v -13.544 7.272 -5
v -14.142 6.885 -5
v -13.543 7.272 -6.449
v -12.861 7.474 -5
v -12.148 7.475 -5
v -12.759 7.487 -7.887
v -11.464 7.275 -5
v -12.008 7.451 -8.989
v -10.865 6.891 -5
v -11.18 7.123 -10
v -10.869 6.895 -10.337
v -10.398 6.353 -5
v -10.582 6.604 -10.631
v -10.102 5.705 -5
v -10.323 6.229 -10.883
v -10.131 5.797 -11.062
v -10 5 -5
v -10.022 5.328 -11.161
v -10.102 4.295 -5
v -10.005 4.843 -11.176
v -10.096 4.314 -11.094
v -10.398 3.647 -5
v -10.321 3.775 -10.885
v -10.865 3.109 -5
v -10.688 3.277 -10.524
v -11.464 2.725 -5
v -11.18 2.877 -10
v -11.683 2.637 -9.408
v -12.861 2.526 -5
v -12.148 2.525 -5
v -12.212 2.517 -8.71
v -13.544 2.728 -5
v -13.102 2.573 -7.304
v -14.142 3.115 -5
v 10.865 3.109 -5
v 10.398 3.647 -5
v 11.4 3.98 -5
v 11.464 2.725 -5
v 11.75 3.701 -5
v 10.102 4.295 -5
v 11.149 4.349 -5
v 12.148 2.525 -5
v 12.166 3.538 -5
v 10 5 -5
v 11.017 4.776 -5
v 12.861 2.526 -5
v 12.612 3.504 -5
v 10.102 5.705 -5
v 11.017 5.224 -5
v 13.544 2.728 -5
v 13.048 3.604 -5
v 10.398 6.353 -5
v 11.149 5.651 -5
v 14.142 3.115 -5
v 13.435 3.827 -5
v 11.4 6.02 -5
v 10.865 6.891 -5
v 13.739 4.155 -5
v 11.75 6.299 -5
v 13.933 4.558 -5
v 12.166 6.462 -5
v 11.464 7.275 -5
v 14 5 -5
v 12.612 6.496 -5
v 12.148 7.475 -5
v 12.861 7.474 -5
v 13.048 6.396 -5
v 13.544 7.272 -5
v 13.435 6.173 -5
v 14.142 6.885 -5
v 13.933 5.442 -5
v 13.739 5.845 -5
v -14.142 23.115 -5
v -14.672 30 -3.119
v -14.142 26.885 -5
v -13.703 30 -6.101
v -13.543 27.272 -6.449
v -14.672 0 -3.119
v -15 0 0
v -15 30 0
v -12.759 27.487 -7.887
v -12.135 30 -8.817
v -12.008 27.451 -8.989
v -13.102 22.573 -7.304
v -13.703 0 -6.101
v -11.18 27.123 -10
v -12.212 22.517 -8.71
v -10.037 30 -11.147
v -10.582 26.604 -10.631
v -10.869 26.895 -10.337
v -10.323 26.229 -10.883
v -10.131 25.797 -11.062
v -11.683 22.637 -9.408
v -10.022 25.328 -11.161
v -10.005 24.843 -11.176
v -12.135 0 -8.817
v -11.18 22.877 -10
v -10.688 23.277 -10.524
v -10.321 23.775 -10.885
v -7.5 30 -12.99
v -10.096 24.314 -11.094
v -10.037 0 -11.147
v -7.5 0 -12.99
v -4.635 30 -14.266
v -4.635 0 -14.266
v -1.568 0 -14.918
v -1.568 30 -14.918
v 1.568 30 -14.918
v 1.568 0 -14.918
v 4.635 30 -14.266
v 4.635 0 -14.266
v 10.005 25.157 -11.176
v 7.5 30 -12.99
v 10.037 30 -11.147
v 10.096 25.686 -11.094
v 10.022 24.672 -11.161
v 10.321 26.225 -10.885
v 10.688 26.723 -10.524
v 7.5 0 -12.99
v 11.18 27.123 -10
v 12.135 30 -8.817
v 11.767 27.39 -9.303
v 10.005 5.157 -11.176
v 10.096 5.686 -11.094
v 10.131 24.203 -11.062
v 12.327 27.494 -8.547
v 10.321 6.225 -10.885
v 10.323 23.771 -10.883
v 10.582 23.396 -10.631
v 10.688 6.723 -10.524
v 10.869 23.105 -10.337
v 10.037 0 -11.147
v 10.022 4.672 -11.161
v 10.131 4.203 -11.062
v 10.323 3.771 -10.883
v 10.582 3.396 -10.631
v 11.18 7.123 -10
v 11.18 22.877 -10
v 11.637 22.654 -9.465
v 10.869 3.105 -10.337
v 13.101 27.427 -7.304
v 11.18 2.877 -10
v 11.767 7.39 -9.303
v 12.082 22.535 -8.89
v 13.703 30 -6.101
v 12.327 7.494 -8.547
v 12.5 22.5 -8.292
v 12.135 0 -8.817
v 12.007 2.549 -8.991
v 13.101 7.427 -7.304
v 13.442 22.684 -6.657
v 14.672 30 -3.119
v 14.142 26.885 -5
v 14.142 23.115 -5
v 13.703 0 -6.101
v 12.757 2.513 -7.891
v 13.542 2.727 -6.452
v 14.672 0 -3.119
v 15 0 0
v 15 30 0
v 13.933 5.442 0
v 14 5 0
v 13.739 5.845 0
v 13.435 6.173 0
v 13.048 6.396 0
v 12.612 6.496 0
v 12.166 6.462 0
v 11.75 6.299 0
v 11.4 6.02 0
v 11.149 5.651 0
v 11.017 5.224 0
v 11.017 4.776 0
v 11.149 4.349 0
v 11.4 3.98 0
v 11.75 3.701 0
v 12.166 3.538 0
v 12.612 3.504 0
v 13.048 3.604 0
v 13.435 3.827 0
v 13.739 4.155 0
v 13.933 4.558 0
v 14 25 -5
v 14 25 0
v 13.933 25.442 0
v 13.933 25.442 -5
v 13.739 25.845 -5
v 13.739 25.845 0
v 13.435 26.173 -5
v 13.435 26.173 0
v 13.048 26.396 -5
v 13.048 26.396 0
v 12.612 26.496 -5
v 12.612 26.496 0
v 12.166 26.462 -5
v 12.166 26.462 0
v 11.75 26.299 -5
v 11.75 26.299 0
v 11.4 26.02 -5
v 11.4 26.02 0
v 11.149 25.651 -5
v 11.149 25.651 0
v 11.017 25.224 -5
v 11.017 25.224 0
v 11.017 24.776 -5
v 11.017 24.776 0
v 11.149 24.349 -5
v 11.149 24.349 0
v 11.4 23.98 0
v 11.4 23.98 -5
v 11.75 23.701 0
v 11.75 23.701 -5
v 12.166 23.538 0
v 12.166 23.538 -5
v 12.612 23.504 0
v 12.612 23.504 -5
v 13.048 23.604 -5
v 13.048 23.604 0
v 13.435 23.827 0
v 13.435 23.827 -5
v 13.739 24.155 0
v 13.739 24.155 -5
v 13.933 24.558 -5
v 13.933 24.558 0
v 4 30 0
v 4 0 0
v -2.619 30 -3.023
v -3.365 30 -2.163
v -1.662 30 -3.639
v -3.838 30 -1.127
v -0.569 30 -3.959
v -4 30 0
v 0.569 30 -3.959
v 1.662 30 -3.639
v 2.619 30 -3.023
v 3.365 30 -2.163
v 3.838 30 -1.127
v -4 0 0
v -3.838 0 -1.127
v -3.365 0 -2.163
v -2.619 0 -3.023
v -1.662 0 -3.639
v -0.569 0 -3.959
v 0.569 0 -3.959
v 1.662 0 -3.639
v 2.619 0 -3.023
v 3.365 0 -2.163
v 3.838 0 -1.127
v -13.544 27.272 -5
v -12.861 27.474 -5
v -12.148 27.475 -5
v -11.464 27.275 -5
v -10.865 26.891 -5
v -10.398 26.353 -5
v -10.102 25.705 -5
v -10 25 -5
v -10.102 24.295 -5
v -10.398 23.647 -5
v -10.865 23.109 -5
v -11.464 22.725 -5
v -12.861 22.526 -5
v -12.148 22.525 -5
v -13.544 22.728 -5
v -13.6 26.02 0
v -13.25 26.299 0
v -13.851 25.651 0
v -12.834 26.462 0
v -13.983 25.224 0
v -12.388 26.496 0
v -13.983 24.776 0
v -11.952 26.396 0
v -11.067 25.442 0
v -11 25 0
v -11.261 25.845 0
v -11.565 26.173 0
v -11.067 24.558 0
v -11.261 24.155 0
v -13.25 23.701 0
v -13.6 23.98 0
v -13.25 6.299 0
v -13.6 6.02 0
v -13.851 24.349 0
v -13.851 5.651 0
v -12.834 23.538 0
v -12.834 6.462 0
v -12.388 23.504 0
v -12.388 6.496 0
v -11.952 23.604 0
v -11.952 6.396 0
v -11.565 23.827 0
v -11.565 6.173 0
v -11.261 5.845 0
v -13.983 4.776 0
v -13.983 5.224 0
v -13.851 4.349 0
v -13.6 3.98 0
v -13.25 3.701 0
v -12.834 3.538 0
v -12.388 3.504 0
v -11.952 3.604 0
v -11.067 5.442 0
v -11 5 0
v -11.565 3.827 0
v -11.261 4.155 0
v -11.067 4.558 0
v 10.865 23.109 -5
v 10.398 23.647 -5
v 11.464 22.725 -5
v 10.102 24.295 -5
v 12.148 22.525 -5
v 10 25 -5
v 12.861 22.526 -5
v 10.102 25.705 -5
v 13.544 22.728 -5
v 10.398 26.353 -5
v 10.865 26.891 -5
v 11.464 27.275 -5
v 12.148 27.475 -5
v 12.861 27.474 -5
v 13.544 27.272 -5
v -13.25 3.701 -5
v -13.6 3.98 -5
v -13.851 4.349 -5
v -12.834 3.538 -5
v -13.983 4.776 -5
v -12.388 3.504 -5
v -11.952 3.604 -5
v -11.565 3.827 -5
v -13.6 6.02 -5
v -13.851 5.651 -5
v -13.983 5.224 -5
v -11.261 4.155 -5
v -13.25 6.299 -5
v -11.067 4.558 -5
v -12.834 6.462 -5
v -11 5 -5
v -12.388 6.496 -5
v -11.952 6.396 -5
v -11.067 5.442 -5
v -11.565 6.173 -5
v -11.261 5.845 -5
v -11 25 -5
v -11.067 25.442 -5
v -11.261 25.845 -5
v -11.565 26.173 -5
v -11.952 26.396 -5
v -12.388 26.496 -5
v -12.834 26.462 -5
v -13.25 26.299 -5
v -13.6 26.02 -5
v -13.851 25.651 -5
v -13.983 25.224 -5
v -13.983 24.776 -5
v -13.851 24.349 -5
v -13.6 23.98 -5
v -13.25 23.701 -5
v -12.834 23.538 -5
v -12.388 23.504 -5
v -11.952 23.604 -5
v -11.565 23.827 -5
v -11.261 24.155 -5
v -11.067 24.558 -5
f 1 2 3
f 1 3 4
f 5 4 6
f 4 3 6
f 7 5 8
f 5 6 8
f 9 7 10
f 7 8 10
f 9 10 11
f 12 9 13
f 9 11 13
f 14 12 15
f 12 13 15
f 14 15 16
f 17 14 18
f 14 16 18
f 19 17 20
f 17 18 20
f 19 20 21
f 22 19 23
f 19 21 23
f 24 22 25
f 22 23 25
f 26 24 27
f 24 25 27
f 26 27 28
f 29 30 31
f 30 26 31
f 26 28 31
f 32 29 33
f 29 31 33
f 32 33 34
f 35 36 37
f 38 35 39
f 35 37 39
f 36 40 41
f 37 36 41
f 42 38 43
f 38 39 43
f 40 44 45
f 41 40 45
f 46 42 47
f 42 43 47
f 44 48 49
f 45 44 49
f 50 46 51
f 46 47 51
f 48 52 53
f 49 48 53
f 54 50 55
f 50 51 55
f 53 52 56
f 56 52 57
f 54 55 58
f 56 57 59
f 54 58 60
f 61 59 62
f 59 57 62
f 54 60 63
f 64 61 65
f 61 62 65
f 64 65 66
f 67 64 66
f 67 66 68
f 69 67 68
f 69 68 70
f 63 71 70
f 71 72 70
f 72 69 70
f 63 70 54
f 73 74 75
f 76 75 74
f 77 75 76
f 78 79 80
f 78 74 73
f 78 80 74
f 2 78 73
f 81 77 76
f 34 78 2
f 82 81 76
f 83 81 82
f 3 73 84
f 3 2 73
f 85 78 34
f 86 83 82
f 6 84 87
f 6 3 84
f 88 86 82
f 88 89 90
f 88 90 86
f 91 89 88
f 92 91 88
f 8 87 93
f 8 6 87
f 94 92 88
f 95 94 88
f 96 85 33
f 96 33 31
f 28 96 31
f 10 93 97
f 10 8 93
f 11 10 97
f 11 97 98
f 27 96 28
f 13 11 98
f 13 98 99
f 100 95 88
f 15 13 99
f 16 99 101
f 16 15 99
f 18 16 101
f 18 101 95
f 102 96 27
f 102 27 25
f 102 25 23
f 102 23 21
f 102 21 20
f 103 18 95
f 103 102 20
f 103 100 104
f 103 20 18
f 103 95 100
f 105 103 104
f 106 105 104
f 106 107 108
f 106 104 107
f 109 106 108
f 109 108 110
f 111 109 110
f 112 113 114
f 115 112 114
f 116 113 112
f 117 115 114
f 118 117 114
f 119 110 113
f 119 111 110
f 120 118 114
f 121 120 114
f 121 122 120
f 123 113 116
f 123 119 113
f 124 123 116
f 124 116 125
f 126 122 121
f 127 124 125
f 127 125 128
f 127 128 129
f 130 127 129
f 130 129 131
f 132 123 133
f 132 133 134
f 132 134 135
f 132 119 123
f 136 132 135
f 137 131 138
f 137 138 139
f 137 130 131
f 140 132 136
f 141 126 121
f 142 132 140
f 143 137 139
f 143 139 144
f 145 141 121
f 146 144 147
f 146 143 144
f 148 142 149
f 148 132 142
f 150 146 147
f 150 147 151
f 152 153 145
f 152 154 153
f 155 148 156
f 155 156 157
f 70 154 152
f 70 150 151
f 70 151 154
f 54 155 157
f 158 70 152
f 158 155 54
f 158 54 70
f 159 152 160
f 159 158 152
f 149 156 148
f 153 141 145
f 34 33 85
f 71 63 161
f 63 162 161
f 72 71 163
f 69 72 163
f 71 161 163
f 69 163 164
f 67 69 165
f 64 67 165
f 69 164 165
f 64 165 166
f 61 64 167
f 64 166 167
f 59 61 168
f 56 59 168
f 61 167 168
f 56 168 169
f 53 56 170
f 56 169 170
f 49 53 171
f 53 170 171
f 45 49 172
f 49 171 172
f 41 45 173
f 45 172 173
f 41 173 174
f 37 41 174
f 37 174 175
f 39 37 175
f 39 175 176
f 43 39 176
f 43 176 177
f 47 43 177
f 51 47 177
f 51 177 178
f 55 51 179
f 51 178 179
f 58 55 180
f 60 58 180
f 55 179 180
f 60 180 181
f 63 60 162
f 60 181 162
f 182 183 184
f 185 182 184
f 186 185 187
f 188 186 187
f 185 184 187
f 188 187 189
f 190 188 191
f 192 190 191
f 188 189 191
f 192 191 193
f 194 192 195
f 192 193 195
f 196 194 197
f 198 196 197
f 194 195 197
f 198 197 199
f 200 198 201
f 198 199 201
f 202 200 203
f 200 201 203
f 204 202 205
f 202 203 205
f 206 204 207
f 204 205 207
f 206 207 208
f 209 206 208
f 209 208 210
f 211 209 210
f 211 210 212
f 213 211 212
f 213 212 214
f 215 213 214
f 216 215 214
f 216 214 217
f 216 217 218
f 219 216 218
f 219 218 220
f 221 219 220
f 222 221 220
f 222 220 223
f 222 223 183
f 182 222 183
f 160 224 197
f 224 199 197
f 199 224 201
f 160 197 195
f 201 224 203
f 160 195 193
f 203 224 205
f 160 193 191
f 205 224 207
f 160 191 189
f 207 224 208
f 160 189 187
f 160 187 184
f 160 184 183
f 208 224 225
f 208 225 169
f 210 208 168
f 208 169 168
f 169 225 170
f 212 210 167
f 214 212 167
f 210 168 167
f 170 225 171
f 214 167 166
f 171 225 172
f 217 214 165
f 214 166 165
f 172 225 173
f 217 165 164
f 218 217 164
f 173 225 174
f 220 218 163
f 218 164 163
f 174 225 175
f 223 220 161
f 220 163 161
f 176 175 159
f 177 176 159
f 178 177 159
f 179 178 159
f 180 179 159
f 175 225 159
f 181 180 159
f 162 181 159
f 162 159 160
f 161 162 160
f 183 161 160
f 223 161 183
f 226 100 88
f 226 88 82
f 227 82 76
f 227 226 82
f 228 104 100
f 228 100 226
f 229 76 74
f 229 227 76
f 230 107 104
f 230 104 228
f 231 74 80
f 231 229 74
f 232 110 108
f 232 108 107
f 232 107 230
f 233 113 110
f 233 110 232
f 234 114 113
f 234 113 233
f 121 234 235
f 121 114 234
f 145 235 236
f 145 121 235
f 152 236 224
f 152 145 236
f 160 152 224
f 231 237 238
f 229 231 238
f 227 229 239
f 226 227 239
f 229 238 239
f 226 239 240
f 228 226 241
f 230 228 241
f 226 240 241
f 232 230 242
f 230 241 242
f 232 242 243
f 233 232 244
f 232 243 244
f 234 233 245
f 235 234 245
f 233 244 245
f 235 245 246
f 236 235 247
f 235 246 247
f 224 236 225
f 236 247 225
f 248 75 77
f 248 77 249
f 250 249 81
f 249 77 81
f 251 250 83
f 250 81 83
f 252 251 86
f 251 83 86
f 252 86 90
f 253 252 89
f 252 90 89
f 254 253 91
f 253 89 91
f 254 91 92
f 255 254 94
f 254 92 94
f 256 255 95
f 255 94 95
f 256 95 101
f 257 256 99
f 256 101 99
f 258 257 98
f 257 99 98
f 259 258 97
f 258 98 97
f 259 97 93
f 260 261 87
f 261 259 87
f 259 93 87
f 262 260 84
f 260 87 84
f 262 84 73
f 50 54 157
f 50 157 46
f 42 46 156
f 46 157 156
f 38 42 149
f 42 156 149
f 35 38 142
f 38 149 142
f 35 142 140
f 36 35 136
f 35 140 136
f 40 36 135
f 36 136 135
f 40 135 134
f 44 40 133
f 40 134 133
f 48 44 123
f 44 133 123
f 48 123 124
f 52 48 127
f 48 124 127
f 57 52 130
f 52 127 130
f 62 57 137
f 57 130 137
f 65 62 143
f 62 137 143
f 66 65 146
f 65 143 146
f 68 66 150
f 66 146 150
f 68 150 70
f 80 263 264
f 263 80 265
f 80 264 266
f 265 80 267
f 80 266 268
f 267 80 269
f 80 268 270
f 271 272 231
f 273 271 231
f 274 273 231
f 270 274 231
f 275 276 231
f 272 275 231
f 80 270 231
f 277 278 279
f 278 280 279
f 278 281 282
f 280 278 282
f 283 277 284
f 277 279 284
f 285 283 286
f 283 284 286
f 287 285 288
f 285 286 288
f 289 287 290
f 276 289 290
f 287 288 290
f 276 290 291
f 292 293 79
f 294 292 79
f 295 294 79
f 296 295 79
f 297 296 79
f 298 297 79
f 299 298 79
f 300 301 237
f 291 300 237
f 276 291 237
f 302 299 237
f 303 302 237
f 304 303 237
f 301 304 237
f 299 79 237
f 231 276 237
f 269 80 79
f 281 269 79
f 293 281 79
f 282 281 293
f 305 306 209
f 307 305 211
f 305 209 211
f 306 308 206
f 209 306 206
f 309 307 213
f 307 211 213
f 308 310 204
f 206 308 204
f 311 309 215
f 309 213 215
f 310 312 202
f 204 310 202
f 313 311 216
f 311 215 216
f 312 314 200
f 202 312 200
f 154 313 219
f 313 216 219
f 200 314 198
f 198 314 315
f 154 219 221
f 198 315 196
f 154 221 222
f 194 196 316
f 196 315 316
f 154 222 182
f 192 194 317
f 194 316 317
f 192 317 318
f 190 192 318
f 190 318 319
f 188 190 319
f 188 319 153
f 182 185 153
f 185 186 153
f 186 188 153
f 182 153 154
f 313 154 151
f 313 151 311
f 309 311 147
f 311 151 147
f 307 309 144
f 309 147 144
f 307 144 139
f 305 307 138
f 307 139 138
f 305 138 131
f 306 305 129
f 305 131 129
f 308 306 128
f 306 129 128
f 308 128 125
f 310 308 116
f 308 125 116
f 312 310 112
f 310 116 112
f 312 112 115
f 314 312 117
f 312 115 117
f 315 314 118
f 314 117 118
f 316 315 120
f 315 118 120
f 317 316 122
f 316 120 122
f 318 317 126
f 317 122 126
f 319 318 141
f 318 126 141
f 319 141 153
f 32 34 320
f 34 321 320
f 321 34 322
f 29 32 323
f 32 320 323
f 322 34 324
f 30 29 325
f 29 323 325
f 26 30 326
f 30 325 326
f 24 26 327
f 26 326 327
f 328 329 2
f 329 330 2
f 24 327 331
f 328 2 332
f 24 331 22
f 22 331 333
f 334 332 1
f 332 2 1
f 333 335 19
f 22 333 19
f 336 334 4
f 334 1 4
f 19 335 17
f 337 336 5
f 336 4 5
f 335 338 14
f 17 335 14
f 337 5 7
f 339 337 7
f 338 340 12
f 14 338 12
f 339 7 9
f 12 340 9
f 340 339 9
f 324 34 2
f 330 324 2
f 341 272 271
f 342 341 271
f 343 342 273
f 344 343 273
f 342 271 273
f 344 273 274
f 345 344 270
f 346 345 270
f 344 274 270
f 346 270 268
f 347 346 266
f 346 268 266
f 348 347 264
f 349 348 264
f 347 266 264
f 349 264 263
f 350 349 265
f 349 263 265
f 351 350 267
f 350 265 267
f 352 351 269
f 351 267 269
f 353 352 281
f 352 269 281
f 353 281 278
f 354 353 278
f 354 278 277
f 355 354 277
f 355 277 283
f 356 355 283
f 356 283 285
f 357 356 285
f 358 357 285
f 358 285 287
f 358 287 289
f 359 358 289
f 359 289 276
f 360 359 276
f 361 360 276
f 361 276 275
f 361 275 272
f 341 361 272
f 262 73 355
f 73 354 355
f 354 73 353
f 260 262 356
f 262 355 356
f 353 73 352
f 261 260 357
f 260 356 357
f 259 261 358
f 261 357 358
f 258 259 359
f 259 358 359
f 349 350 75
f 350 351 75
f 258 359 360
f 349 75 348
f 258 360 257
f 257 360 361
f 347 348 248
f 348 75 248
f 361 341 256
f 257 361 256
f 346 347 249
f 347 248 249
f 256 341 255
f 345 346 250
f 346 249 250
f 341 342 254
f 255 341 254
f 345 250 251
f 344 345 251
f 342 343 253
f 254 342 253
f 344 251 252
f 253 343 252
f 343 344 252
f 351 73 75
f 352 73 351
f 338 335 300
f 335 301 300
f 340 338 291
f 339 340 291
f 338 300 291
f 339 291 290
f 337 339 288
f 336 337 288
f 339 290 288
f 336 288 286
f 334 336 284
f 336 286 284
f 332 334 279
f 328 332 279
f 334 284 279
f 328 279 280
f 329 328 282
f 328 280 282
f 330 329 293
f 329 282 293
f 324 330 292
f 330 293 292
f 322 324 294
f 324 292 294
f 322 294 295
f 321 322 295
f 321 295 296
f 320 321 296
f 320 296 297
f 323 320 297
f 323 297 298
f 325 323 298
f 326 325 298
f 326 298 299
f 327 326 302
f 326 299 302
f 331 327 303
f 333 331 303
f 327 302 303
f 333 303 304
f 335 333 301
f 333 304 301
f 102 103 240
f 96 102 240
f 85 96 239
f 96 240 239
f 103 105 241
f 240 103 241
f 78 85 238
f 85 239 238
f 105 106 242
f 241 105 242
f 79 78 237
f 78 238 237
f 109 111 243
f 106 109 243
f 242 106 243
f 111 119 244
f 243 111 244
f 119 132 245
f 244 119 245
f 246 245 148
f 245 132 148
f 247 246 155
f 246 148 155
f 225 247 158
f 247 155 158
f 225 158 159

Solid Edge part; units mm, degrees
sketch "Sketch1" plane through (0, 0, 0) normal (0, -1, 0) x (1, 0, 0)
  line L0 (4, 0) -> (15, 0)
  line L1 (-15, 0) -> (-4, 0)
  arc A0 (-4, 0) -> (4, 0) centre (0, 0) ccw
  arc A1 (15, 0) -> (-15, 0) centre (0, 0) cw
extrude "Protrusion1" add sketch "Sketch1" against normal blind 30
sketch "Sketch2" plane through (-9.5, 15, 0) normal (0, 0, 1) x (1, 0, 0)
  circle A0 centre (-3, 10) radius 1.5
  circle A1 centre (22, 10) radius 1.5
  circle A2 centre (22, -10) radius 1.5
  circle A3 centre (-3, -10) radius 1.5
extrude "ExtrudedCutout_1" cut sketch "Sketch2" against normal blind 20
sketch "Sketch3" plane through (9.5, 15, -10) normal (0, 0, 1) x (0, -1, 0)
  circle A0 centre (-10, 3) radius 2.5
  circle A1 centre (10, 3) radius 2.5
  circle A2 centre (-10, -22) radius 2.5
  circle A3 centre (10, -22) radius 2.5
extrude "ExtrudedCutout_2" cut sketch "Sketch3" along normal mid plane 10
